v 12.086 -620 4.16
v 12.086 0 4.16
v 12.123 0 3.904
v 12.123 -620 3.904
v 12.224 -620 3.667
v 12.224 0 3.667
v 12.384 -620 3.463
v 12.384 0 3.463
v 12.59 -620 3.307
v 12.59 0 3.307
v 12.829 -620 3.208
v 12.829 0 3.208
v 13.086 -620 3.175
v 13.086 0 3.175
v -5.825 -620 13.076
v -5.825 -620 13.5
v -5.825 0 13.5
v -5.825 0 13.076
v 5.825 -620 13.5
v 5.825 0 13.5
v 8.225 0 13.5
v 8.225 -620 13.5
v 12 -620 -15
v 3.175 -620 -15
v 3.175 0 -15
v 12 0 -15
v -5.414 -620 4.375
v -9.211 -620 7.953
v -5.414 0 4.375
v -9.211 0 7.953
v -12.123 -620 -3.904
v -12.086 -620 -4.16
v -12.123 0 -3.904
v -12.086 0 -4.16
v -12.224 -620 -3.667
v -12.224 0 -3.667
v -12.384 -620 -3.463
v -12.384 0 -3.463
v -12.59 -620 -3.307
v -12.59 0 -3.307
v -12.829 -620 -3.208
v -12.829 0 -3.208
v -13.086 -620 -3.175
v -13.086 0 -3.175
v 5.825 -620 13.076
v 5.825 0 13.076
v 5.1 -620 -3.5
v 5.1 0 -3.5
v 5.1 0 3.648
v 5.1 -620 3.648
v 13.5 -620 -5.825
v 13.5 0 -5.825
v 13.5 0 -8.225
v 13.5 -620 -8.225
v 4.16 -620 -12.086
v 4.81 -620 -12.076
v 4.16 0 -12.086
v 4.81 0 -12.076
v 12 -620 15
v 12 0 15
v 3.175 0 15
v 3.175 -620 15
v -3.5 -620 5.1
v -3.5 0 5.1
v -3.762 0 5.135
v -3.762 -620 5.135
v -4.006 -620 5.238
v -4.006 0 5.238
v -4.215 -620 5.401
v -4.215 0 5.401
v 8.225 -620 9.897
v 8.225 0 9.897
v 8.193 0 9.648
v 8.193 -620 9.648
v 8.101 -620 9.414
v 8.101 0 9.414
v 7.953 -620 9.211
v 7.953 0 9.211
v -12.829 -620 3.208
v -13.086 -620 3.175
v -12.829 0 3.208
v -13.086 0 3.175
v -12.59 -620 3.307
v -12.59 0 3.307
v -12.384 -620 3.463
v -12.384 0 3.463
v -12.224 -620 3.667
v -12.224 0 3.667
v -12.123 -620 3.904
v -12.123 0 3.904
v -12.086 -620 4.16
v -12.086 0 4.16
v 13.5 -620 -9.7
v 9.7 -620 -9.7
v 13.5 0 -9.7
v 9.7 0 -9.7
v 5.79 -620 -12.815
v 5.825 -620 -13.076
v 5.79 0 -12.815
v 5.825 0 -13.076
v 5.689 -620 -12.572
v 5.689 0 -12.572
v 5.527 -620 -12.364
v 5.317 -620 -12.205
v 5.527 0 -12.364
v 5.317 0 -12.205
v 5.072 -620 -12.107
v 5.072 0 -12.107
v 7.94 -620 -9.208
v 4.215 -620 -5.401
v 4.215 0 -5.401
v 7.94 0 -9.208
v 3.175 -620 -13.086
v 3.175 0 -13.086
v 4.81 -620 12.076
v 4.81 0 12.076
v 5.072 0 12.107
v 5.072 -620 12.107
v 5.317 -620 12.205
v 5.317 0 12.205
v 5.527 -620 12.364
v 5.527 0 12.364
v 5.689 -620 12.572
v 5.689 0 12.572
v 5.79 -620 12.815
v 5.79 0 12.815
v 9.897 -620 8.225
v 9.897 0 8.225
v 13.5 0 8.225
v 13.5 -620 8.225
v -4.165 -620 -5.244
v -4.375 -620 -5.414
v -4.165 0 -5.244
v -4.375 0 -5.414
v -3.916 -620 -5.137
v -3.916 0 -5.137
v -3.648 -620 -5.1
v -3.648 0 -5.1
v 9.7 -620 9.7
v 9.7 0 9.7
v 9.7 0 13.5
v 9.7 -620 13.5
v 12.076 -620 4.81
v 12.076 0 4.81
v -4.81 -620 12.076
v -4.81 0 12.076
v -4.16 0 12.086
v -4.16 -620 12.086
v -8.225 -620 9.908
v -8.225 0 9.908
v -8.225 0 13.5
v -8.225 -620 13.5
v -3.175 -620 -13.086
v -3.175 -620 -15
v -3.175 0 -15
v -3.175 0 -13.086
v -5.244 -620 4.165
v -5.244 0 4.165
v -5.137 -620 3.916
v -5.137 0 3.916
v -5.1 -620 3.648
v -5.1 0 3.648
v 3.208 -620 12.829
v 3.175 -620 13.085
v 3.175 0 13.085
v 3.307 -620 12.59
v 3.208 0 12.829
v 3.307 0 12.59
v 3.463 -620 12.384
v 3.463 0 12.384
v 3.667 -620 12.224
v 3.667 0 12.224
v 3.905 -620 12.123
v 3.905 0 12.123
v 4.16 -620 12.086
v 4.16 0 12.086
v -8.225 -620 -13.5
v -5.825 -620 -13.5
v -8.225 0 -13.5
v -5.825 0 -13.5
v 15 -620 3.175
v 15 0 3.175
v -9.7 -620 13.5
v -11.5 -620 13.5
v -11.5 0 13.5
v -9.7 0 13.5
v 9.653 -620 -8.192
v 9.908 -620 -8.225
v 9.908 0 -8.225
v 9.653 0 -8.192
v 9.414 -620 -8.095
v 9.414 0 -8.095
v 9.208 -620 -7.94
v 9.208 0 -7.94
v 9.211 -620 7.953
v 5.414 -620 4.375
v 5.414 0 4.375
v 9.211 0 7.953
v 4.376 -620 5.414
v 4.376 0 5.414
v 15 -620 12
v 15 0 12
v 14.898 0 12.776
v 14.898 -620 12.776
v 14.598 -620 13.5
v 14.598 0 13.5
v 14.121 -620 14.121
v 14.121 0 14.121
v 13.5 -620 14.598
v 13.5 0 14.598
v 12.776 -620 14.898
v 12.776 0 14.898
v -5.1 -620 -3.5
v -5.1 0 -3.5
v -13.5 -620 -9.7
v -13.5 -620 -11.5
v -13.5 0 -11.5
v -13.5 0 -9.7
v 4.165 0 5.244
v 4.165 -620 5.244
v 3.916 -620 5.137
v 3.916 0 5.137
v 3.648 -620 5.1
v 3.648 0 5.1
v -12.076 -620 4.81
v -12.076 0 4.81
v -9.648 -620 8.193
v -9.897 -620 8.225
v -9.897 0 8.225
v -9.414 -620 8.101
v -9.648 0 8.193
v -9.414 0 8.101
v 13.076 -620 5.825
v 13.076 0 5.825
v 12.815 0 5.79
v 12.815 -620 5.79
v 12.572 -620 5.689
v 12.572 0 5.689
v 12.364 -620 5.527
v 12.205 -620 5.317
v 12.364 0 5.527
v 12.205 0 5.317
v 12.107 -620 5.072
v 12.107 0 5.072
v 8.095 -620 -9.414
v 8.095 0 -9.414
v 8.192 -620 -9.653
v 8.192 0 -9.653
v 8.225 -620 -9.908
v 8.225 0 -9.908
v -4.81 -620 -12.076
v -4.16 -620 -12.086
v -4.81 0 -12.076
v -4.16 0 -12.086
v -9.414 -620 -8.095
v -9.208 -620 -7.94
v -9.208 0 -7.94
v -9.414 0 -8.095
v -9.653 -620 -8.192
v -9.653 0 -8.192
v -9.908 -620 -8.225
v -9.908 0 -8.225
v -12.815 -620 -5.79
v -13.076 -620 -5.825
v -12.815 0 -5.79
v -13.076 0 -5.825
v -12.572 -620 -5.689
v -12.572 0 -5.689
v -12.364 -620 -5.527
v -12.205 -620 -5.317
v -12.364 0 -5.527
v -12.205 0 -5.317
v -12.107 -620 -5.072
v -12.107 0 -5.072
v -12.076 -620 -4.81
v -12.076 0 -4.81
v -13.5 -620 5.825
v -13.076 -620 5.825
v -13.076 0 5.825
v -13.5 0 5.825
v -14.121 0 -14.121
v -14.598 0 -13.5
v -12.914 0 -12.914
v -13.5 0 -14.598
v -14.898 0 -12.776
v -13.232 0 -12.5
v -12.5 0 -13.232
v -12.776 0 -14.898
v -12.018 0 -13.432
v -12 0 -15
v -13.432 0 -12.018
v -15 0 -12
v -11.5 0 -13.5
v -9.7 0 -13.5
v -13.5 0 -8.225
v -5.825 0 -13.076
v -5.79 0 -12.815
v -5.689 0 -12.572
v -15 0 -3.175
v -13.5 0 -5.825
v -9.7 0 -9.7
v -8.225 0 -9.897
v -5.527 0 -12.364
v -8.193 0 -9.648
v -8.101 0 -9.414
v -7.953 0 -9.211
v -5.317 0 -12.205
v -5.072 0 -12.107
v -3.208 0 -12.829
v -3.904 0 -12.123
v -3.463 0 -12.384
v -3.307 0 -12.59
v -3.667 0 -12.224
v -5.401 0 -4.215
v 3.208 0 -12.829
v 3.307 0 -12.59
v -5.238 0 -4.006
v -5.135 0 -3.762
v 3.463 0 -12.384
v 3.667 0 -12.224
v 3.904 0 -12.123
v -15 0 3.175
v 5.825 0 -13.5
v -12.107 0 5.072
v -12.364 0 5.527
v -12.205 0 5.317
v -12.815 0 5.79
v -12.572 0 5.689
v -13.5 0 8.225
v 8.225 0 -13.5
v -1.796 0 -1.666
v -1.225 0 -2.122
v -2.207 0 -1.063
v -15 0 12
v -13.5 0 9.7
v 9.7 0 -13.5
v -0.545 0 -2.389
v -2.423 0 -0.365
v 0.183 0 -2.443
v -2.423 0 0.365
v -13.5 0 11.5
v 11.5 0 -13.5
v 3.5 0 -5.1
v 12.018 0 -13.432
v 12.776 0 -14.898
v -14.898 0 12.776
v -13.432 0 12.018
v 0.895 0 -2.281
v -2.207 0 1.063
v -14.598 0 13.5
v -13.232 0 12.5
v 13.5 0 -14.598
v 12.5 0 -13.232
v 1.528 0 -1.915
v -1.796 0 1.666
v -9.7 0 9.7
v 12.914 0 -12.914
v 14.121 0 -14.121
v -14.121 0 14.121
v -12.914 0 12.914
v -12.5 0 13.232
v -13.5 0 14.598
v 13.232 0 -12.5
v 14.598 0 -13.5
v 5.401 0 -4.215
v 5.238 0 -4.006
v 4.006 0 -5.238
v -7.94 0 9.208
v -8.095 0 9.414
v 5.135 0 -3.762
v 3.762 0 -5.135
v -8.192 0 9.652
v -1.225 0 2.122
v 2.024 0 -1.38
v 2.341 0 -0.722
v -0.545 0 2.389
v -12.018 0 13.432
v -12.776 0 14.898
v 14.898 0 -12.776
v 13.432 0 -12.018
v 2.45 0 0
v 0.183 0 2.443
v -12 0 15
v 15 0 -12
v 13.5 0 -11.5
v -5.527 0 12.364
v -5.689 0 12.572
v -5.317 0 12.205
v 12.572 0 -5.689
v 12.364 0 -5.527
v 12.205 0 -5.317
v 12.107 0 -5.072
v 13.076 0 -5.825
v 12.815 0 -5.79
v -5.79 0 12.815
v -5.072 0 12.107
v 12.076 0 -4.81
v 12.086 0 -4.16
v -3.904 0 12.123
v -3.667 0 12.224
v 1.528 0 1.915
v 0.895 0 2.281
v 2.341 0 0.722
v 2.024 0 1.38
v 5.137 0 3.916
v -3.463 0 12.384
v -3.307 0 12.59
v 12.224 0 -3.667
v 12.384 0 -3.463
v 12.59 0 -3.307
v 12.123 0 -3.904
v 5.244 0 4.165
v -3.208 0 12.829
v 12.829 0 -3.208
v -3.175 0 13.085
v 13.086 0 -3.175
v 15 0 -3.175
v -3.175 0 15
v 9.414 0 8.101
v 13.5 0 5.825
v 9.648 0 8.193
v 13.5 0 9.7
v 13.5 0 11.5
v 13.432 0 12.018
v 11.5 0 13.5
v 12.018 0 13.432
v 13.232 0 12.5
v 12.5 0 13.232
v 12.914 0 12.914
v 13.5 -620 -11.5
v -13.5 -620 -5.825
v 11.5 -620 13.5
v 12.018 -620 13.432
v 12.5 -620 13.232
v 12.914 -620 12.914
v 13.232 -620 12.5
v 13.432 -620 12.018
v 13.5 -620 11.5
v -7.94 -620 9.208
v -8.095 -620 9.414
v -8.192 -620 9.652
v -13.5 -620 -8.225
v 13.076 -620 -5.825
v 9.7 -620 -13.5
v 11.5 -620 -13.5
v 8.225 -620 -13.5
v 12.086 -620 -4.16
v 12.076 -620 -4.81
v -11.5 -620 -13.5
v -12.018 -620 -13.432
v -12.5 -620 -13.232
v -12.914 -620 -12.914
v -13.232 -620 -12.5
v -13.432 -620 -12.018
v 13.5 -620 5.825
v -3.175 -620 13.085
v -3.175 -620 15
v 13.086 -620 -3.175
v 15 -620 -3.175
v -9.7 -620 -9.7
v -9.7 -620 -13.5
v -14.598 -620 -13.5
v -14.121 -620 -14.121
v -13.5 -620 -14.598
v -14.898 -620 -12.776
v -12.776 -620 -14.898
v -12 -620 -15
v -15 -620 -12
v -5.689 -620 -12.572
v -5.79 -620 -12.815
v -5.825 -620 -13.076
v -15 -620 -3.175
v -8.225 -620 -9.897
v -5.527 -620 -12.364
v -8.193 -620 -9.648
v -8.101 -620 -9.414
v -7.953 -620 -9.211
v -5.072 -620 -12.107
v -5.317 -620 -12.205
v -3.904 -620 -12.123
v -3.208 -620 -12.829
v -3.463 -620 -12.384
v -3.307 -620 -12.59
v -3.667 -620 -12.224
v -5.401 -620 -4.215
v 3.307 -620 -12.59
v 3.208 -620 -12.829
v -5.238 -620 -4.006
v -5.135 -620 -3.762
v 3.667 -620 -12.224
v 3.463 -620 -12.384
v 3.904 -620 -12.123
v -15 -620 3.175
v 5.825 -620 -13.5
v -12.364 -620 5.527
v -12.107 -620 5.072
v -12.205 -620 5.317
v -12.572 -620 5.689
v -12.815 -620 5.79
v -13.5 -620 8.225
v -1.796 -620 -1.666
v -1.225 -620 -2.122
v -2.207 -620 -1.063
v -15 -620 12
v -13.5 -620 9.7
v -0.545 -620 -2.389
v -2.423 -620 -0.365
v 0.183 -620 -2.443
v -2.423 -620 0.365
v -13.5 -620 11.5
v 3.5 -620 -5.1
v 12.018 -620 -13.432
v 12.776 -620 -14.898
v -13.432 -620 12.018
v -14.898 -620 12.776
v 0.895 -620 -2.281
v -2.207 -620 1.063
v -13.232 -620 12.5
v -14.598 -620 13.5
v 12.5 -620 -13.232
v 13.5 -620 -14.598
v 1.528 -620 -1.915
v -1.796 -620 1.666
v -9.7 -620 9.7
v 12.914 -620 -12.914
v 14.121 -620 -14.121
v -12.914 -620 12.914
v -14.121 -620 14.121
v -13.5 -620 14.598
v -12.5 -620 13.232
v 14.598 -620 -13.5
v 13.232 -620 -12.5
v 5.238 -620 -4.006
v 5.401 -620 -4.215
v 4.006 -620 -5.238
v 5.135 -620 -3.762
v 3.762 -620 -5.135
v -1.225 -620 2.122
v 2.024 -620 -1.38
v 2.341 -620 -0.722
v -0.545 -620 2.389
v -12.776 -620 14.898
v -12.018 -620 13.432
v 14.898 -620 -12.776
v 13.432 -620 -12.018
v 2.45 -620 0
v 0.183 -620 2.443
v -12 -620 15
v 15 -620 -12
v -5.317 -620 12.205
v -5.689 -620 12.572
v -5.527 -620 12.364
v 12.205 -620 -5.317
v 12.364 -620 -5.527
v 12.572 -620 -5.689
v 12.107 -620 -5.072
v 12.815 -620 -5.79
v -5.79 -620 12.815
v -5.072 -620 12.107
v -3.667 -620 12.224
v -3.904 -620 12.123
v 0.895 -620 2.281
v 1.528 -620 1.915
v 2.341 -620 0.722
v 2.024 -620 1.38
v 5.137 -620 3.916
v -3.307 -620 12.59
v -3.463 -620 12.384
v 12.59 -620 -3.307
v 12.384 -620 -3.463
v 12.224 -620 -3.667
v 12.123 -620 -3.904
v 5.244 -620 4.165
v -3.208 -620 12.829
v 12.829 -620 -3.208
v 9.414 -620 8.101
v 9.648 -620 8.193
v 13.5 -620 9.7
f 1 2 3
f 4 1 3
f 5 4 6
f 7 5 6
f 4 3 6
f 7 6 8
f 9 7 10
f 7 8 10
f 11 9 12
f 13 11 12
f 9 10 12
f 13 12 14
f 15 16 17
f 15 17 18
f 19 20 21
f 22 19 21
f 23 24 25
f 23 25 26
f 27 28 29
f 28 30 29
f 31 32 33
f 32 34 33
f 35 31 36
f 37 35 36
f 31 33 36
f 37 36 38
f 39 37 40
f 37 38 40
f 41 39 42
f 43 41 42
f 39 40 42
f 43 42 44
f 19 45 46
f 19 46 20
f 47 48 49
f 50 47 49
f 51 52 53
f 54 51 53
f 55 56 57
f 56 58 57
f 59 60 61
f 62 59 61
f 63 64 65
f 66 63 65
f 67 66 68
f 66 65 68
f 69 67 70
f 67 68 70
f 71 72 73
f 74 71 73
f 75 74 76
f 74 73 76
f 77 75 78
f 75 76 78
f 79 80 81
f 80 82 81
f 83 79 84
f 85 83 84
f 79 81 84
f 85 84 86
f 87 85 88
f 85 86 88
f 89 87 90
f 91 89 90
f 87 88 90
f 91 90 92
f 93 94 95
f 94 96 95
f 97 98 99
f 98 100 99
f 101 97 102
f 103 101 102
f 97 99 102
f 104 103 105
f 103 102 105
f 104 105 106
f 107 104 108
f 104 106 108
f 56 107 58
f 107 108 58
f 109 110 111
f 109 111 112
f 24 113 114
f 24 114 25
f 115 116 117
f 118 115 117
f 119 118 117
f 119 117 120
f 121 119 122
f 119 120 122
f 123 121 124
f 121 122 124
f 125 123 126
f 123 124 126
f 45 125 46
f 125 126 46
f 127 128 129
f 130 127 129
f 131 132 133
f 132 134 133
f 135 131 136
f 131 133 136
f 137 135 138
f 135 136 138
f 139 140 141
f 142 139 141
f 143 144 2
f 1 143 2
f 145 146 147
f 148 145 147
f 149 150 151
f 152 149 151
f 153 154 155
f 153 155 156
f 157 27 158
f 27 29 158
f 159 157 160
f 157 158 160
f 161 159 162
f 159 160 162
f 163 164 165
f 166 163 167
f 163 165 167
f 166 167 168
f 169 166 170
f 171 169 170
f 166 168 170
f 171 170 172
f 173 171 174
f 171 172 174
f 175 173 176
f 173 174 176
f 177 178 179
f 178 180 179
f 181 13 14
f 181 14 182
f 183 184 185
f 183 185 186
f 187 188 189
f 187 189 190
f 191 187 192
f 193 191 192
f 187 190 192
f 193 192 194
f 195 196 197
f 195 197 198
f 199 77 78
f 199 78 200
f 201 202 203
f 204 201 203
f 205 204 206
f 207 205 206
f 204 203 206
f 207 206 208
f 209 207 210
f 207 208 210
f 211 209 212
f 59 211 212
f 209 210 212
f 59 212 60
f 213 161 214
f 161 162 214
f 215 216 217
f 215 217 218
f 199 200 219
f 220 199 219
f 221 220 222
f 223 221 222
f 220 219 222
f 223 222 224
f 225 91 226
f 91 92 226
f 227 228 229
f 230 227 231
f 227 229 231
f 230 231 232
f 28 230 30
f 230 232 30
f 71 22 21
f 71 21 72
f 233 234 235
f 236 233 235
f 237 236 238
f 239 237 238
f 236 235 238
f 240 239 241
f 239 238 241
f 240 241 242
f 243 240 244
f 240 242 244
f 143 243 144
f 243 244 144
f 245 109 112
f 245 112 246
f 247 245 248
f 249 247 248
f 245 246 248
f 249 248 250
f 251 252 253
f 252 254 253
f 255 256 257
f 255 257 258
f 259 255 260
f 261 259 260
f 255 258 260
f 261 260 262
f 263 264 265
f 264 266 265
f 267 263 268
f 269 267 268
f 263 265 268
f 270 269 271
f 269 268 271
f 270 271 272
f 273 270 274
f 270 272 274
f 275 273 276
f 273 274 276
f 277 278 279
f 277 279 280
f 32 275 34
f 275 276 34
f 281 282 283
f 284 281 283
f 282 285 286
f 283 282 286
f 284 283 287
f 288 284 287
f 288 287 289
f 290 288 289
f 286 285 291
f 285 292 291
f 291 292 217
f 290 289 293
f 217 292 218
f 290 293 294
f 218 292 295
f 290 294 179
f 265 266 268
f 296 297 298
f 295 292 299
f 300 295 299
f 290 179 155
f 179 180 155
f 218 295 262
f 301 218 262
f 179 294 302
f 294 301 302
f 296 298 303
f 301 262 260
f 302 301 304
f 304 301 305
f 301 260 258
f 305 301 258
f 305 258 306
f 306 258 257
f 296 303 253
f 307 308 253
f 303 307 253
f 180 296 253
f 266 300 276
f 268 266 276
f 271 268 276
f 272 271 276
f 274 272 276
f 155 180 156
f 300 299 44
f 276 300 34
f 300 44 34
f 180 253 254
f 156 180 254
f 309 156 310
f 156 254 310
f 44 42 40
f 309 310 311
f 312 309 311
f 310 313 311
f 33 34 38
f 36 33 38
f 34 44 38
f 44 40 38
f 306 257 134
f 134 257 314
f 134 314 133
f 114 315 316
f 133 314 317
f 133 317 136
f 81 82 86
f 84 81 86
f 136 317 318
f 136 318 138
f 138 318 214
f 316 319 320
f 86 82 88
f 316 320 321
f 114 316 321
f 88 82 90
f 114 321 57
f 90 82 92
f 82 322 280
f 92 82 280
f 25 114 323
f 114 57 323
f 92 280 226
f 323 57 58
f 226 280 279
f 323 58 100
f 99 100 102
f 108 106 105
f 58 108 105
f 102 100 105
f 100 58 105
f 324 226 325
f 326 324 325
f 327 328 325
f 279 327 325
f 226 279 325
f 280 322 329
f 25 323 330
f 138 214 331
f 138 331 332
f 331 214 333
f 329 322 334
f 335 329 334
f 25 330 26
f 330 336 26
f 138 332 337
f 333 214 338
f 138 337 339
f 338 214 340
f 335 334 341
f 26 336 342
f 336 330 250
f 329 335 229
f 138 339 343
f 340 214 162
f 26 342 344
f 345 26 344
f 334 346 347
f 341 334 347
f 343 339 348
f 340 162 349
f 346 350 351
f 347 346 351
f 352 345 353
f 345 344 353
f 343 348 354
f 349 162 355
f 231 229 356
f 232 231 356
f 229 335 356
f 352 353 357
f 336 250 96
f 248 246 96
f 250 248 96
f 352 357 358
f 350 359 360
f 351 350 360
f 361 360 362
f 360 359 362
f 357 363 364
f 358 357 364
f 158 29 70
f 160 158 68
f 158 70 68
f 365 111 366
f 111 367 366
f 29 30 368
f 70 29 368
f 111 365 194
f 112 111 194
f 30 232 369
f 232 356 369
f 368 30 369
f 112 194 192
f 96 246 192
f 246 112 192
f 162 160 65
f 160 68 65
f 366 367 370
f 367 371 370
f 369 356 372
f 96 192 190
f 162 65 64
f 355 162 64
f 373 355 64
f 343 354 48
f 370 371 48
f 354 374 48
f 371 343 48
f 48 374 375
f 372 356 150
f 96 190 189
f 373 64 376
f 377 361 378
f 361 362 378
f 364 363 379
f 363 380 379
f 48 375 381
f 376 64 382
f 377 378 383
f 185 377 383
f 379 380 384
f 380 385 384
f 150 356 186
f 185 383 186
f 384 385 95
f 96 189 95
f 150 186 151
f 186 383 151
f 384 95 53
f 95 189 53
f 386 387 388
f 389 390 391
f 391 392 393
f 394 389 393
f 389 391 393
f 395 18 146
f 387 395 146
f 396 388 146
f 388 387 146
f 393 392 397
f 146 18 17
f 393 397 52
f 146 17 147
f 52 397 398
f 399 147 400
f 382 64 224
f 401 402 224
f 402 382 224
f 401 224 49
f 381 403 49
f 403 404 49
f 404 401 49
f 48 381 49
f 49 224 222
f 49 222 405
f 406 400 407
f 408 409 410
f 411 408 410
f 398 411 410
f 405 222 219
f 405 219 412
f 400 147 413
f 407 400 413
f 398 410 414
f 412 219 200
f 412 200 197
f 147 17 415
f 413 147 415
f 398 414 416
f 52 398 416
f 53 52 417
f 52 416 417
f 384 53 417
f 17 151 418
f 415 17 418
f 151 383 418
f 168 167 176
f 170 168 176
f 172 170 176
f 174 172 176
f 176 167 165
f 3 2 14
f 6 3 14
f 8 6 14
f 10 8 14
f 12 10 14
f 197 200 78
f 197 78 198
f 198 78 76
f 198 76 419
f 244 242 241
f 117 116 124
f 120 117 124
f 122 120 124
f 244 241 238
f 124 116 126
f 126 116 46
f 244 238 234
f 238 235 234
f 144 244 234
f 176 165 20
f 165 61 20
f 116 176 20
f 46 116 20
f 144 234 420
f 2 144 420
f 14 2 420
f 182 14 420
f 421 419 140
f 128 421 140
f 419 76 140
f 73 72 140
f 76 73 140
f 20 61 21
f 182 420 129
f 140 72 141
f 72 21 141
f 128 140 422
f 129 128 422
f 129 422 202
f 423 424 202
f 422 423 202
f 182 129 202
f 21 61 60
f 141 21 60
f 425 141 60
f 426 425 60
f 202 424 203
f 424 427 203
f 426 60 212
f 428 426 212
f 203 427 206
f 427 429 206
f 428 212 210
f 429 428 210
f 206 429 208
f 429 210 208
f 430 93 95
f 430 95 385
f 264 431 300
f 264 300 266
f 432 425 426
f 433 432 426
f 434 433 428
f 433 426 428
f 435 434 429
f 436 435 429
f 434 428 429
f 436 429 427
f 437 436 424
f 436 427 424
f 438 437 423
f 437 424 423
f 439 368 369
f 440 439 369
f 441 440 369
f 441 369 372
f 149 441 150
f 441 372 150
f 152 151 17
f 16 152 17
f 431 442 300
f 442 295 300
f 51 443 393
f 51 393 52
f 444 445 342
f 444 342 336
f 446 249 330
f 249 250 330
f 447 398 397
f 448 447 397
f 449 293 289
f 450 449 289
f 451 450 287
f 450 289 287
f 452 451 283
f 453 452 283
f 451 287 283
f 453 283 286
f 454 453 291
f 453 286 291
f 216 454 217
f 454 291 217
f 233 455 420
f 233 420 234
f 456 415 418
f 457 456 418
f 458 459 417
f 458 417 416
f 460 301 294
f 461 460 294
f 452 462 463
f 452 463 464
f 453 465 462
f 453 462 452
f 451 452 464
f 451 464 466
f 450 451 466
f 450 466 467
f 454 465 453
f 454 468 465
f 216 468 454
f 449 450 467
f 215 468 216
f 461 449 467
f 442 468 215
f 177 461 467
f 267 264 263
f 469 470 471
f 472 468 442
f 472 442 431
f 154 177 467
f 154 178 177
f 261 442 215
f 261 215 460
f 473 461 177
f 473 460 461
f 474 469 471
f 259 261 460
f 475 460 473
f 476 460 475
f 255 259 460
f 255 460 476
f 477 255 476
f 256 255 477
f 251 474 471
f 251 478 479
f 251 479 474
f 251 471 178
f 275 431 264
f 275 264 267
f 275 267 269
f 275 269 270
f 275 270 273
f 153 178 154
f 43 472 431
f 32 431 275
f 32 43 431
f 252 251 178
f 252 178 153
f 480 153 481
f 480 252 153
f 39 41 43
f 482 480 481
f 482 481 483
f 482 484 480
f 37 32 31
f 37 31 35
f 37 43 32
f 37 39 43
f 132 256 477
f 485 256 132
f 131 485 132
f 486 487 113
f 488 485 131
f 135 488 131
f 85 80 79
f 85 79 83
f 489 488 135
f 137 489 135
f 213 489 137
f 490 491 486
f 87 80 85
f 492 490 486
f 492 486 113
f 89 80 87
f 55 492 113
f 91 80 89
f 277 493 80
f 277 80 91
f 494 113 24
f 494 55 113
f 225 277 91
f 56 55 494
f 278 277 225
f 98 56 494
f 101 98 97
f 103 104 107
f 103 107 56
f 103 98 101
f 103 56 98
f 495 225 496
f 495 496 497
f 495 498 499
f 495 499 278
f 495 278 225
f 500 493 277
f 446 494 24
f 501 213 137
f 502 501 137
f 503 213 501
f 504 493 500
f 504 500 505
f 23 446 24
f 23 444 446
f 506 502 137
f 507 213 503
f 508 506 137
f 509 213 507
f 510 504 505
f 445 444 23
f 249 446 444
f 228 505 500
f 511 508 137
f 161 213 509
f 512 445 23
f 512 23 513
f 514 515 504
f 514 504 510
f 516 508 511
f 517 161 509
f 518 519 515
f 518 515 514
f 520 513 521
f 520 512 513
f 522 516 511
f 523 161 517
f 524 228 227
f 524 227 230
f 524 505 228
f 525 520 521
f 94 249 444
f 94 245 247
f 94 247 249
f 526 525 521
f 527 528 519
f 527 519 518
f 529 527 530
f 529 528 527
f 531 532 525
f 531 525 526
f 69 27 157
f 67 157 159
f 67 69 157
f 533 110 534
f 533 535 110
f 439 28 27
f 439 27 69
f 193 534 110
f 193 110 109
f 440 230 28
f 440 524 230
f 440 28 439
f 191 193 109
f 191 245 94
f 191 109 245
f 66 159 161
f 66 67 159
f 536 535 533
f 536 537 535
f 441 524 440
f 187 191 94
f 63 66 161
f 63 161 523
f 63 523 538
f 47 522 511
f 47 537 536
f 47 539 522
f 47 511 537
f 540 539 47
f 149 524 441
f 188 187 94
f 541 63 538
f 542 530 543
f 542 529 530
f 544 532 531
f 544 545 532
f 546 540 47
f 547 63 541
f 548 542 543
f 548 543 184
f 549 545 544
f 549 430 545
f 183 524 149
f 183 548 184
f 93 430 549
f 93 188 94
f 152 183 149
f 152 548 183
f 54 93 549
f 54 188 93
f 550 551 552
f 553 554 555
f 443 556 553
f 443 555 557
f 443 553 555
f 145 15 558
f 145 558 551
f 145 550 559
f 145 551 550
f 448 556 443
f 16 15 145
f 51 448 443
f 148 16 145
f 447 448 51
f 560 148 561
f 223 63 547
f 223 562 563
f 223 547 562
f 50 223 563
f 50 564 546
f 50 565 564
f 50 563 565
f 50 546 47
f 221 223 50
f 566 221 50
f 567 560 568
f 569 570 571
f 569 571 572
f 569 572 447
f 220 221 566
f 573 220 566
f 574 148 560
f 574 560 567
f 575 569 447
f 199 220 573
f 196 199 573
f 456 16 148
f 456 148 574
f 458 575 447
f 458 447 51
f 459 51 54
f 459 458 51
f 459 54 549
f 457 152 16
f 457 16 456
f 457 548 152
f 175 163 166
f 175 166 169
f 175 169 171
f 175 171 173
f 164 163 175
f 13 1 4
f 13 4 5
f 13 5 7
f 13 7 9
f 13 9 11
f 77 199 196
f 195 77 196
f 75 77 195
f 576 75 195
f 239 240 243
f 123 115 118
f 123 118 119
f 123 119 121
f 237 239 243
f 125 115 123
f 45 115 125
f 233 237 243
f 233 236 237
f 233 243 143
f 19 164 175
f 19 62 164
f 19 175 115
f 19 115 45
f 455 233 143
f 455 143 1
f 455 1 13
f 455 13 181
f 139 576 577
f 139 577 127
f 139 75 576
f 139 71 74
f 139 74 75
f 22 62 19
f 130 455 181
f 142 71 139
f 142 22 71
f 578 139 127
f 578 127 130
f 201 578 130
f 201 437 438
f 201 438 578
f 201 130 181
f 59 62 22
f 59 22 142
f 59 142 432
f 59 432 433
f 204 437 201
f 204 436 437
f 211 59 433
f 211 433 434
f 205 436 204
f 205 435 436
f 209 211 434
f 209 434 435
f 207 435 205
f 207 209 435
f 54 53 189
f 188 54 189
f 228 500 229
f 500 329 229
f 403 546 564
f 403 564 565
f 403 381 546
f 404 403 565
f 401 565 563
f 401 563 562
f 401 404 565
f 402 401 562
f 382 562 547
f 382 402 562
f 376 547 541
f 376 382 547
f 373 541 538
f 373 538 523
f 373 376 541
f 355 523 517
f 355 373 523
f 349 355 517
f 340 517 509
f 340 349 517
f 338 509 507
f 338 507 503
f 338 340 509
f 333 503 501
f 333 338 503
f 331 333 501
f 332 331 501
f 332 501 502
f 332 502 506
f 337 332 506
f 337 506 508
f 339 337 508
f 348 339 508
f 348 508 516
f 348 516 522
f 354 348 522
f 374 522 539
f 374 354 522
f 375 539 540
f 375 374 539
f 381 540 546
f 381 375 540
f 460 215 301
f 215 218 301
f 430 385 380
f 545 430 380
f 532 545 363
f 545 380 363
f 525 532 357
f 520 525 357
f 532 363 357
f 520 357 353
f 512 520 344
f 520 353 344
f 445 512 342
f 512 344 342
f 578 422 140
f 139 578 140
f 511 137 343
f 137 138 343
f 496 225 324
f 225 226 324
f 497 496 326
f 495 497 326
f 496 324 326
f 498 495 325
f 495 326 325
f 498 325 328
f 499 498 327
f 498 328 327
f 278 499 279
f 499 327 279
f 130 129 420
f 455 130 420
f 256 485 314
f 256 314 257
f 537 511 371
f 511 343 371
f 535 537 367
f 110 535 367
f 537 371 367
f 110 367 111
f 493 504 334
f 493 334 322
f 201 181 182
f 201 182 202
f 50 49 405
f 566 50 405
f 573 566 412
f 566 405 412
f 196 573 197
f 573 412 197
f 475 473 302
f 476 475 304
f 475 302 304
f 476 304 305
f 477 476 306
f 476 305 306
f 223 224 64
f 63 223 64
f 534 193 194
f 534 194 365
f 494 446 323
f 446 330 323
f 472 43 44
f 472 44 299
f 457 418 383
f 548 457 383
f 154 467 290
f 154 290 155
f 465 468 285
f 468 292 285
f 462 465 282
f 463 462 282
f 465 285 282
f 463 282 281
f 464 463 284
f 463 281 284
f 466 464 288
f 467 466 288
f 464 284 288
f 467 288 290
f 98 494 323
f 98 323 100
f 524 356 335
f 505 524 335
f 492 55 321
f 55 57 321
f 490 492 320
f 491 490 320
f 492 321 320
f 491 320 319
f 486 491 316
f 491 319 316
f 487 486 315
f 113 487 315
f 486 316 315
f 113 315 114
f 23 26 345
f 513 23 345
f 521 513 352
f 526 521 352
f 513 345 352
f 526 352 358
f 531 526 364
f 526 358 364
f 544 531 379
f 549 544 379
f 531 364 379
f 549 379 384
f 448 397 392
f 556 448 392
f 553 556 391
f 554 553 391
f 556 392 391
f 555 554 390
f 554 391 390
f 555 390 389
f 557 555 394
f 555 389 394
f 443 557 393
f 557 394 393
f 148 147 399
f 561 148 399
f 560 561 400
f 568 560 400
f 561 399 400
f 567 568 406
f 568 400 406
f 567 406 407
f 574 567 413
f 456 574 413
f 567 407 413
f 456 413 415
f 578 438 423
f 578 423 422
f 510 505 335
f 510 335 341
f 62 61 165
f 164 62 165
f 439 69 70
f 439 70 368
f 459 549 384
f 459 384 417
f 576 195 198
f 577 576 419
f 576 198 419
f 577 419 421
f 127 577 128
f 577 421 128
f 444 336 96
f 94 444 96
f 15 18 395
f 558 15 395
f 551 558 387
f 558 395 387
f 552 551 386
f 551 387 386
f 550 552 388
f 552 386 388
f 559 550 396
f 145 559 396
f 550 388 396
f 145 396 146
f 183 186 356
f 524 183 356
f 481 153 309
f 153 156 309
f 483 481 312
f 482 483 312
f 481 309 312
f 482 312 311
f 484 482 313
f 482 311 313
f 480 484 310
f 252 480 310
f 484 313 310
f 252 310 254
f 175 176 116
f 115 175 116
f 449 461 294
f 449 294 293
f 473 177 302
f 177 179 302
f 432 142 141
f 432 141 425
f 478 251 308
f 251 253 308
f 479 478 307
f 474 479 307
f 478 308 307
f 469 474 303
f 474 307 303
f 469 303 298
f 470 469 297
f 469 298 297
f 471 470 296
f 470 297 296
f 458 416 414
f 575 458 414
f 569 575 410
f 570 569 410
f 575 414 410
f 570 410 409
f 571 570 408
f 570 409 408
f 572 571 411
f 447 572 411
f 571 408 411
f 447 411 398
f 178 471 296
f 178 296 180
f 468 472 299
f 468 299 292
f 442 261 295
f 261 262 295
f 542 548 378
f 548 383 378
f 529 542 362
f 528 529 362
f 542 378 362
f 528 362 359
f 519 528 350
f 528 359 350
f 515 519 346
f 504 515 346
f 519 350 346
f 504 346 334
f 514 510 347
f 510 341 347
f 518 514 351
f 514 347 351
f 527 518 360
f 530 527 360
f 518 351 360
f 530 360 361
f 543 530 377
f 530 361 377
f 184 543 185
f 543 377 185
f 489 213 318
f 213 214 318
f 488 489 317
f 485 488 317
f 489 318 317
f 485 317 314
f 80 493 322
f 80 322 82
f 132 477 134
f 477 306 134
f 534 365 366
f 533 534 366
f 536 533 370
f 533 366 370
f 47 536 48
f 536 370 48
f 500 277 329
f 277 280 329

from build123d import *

# Parameters (mm, degrees)
F0_R     = 2.45
F1_DEPTH = 460
F2_DEPTH = 160


# Not quite as in the source:
# - ends of sketch curves that miss each other by under 0.0002 mm in the source are joined


with BuildPart() as f1:
    # F0 (on Front) → F1 (new body)
    with BuildSketch(Plane.XZ):
        with BuildLine():
            Line((-3.1749674082, 15), (-12, 15))
            ThreePointArc((-12, 15), (-14.1213203436, 14.1213203436), (-15, 12))
            Line((-15, 12), (-15, 3.175))
            Line((-15, 3.175), (-13.0855346263, 3.175))
            ThreePointArc((-13.0855346263, 3.175), (-12.3835980145, 3.4627605788), (-12.0856407741, 4.1604300138))
            Line((-12.0856407741, 4.1604300138), (-12.0761692778, 4.8104300138))
            ThreePointArc((-12.0761692778, 4.8104300138), (-12.3638237087, 5.5269366118), (-13.0760631299, 5.825))
            Line((-13.0760631299, 5.825), (-13.5, 5.825))
            Line((-13.5, 5.825), (-13.5, 8.225))
            Line((-13.5, 8.225), (-9.8968845016, 8.225))
            ThreePointArc((-9.8968845016, 8.225), (-9.5279915195, 8.1544718757), (-9.2111331975, 7.9528359354))
            Line((-9.2111331975, 7.9528359354), (-5.4142486959, 4.3754933338))
            ThreePointArc((-5.4142486959, 4.3754933338), (-5.1819174045, 4.0440465354), (-5.1, 3.6476573984))
            Line((-5.1, 3.6476573984), (-5.1, -3.4999243287))
            ThreePointArc((-5.1, -3.4999243287), (-5.1782354607, -3.8876744211), (-5.4007002683, -4.2147528992))
            Line((-5.4007002683, -4.2147528992), (-9.2084959767, -7.9398285705))
            ThreePointArc((-9.2084959767, -7.9398285705), (-9.5301904718, -8.1509666761), (-9.9077957084, -8.225))
            Line((-9.9077957084, -8.225), (-13.5, -8.225))
            Line((-13.5, -8.225), (-13.5, -5.825))
            Line((-13.5, -5.825), (-13.0760631299, -5.825))
            ThreePointArc((-13.0760631299, -5.825), (-12.3638237087, -5.5269366118), (-12.0761692778, -4.8104300138))
            Line((-12.0761692778, -4.8104300138), (-12.0856407741, -4.1604300138))
            ThreePointArc((-12.0856407741, -4.1604300138), (-12.3835980145, -3.4627605788), (-13.0855346263, -3.175))
            Line((-13.0855346263, -3.175), (-15, -3.175))
            Line((-15, -3.175), (-15, -12))
            ThreePointArc((-15, -12), (-14.1213203436, -14.1213203436), (-12, -15))
            Line((-12, -15), (-3.175, -15))
            Line((-3.175, -15), (-3.175, -13.0855346263))
            ThreePointArc((-3.175, -13.0855346263), (-3.4627605788, -12.3835980145), (-4.1604300138, -12.0856407741))
            Line((-4.1604300138, -12.0856407741), (-4.8104300138, -12.0761692778))
            ThreePointArc((-4.8104300138, -12.0761692778), (-5.5269366118, -12.3638237087), (-5.825, -13.0760631299))
            Line((-5.825, -13.0760631299), (-5.825, -13.5))
            Line((-5.825, -13.5), (-8.225, -13.5))
            Line((-8.225, -13.5), (-8.225, -9.8968845016))
            ThreePointArc((-8.225, -9.8968845016), (-8.1544718757, -9.5279915195), (-7.9528359354, -9.2111331975))
            Line((-7.9528359354, -9.2111331975), (-4.3754933338, -5.4142486959))
            ThreePointArc((-4.3754933338, -5.4142486959), (-4.0440465354, -5.1819174045), (-3.6476573984, -5.1))
            Line((-3.6476573984, -5.1), (3.4999243287, -5.1))
            ThreePointArc((3.4999243287, -5.1), (3.8876744211, -5.1782354607), (4.2147528992, -5.4007002683))
            Line((4.2147528992, -5.4007002683), (7.9398285705, -9.2084959767))
            ThreePointArc((7.9398285705, -9.2084959767), (8.1509666761, -9.5301904718), (8.225, -9.9077957084))
            Line((8.225, -9.9077957084), (8.225, -13.5))
            Line((8.225, -13.5), (5.825, -13.5))
            Line((5.825, -13.5), (5.825, -13.0760631299))
            ThreePointArc((5.825, -13.0760631299), (5.5269366118, -12.3638237087), (4.8104300138, -12.0761692778))
            Line((4.8104300138, -12.0761692778), (4.1604300138, -12.0856407741))
            ThreePointArc((4.1604300138, -12.0856407741), (3.4627605788, -12.3835980145), (3.175, -13.0855346263))
            Line((3.175, -13.0855346263), (3.175, -15))
            Line((3.175, -15), (12, -15))
            ThreePointArc((12, -15), (14.1213203436, -14.1213203436), (15, -12))
            Line((15, -12), (15, -3.175))
            Line((15, -3.175), (13.0855346263, -3.175))
            ThreePointArc((13.0855346263, -3.175), (12.3835980145, -3.4627605788), (12.0856407741, -4.1604300138))
            Line((12.0856407741, -4.1604300138), (12.0761692778, -4.8104300138))
            ThreePointArc((12.0761692778, -4.8104300138), (12.3638237087, -5.5269366118), (13.0760631299, -5.825))
            Line((13.0760631299, -5.825), (13.5, -5.825))
            Line((13.5, -5.825), (13.5, -8.225))
            Line((13.5, -8.225), (9.9077957084, -8.225))
            ThreePointArc((9.9077957084, -8.225), (9.5301904718, -8.1509666761), (9.2084959767, -7.9398285705))
            Line((9.2084959767, -7.9398285705), (5.4007002683, -4.2147528992))
            ThreePointArc((5.4007002683, -4.2147528992), (5.1782354607, -3.8876744211), (5.1, -3.4999243287))
            Line((5.1, -3.4999243287), (5.1, 3.6476573984))
            ThreePointArc((5.1, 3.6476573984), (5.1819174045, 4.0440465354), (5.4142486959, 4.3754933338))
            Line((5.4142486959, 4.3754933338), (9.2111331975, 7.9528359354))
            ThreePointArc((9.2111331975, 7.9528359354), (9.5279915195, 8.1544718757), (9.8968845016, 8.225))
            Line((9.8968845016, 8.225), (13.5, 8.225))
            Line((13.5, 8.225), (13.5, 5.825))
            Line((13.5, 5.825), (13.0760631299, 5.825))
            ThreePointArc((13.0760631299, 5.825), (12.3638237087, 5.5269366118), (12.0761692778, 4.8104300138))
            Line((12.0761692778, 4.8104300138), (12.0856407741, 4.1604300138))
            ThreePointArc((12.0856407741, 4.1604300138), (12.3835980145, 3.4627605788), (13.0855346263, 3.175))
            Line((13.0855346263, 3.175), (15, 3.175))
            Line((15, 3.175), (15, 12))
            ThreePointArc((15, 12), (14.1213203436, 14.1213203436), (12, 15))
            Line((12, 15), (3.1750325918, 15))
            Line((3.1750325918, 15), (3.1750325918, 13.0854824722))
            ThreePointArc((3.1750325918, 13.0854824722), (3.4627931706, 12.3835458604), (4.1604626057, 12.0855886201))
            Line((4.1604626057, 12.0855886201), (4.8104626057, 12.0761171237))
            ThreePointArc((4.8104626057, 12.0761171237), (5.5269692036, 12.3637715546), (5.8250325918, 13.0760109758))
            Line((5.8250325918, 13.0760109758), (5.8250325918, 13.4999478459))
            Line((5.8250325918, 13.4999478459), (8.2250325918, 13.4999478459))
            Line((8.2250325918, 13.4999478459), (8.2250325918, 9.8968323476))
            ThreePointArc((8.2250325918, 9.8968323476), (8.1545044675, 9.5279393654), (7.9528685272, 9.2110810434))
            Line((7.9528685272, 9.2110810434), (4.3755259256, 5.4141965418))
            ThreePointArc((4.3755259256, 5.4141965418), (4.0440791272, 5.1818652505), (3.6476899902, 5.0999478459))
            Line((3.6476899902, 5.0999478459), (-3.4998917369, 5.0999478459))
            ThreePointArc((-3.4998917369, 5.0999478459), (-3.8876418293, 5.1781833067), (-4.2147203074, 5.4006481142))
            Line((-4.2147203074, 5.4006481142), (-7.9397959787, 9.2084438226))
            ThreePointArc((-7.9397959787, 9.2084438226), (-8.1509340843, 9.5301383177), (-8.2249674082, 9.9077435543))
            Line((-8.2249674082, 9.9077435543), (-8.2249674082, 13.4999478459))
            Line((-8.2249674082, 13.4999478459), (-5.8249674082, 13.4999478459))
            Line((-5.8249674082, 13.4999478459), (-5.8249674082, 13.0760109758))
            ThreePointArc((-5.8249674082, 13.0760109758), (-5.5269040199, 12.3637715546), (-4.810397422, 12.0761171237))
            Line((-4.810397422, 12.0761171237), (-4.160397422, 12.0855886201))
            ThreePointArc((-4.160397422, 12.0855886201), (-3.462727987, 12.3835458604), (-3.1749674082, 13.0854824722))
            Line((-3.1749674082, 13.0854824722), (-3.1749674082, 15))
        make_face()
        with BuildLine():
            Line((-13.5, -11.5), (-13.5, -9.7))
            Line((-13.5, -9.7), (-9.7, -9.7))
            Line((-9.7, -9.7), (-9.7, -13.5))
            Line((-9.7, -13.5), (-11.5, -13.5))
            ThreePointArc((-11.5, -13.5), (-12.9142135624, -12.9142135624), (-13.5, -11.5))
        make_face(mode=Mode.SUBTRACT)
        with BuildLine():
            Line((9.7, -9.7), (13.5, -9.7))
            Line((13.5, -9.7), (13.5, -11.5))
            ThreePointArc((13.5, -11.5), (12.9142135624, -12.9142135624), (11.5, -13.5))
            Line((11.5, -13.5), (9.7, -13.5))
            Line((9.7, -13.5), (9.7, -9.7))
        make_face(mode=Mode.SUBTRACT)
        with BuildLine():
            ThreePointArc((-13.5, 11.5), (-12.9142135624, 12.9142135624), (-11.5, 13.5))
            Line((-11.5, 13.5), (-9.7, 13.5))
            Line((-9.7, 13.5), (-9.7, 9.7))
            Line((-9.7, 9.7), (-13.5, 9.7))
            Line((-13.5, 9.7), (-13.5, 11.5))
        make_face(mode=Mode.SUBTRACT)
        Circle(F0_R, mode=Mode.SUBTRACT)
        with BuildLine():
            Line((9.7, 13.5), (11.5, 13.5))
            ThreePointArc((11.5, 13.5), (12.9142135624, 12.9142135624), (13.5, 11.5))
            Line((13.5, 11.5), (13.5, 9.7))
            Line((13.5, 9.7), (9.7, 9.7))
            Line((9.7, 9.7), (9.7, 13.5))
        make_face(mode=Mode.SUBTRACT)
    extrude(amount=F1_DEPTH)

    # F2 (add): a face of the model
    f2_faces = [f1.faces().sort_by_distance(p)[0] for p in [
        (5.2291627207, -460, 12.6659491494),
    ]]
    extrude(f2_faces, amount=F2_DEPTH)


solid = f1.part
